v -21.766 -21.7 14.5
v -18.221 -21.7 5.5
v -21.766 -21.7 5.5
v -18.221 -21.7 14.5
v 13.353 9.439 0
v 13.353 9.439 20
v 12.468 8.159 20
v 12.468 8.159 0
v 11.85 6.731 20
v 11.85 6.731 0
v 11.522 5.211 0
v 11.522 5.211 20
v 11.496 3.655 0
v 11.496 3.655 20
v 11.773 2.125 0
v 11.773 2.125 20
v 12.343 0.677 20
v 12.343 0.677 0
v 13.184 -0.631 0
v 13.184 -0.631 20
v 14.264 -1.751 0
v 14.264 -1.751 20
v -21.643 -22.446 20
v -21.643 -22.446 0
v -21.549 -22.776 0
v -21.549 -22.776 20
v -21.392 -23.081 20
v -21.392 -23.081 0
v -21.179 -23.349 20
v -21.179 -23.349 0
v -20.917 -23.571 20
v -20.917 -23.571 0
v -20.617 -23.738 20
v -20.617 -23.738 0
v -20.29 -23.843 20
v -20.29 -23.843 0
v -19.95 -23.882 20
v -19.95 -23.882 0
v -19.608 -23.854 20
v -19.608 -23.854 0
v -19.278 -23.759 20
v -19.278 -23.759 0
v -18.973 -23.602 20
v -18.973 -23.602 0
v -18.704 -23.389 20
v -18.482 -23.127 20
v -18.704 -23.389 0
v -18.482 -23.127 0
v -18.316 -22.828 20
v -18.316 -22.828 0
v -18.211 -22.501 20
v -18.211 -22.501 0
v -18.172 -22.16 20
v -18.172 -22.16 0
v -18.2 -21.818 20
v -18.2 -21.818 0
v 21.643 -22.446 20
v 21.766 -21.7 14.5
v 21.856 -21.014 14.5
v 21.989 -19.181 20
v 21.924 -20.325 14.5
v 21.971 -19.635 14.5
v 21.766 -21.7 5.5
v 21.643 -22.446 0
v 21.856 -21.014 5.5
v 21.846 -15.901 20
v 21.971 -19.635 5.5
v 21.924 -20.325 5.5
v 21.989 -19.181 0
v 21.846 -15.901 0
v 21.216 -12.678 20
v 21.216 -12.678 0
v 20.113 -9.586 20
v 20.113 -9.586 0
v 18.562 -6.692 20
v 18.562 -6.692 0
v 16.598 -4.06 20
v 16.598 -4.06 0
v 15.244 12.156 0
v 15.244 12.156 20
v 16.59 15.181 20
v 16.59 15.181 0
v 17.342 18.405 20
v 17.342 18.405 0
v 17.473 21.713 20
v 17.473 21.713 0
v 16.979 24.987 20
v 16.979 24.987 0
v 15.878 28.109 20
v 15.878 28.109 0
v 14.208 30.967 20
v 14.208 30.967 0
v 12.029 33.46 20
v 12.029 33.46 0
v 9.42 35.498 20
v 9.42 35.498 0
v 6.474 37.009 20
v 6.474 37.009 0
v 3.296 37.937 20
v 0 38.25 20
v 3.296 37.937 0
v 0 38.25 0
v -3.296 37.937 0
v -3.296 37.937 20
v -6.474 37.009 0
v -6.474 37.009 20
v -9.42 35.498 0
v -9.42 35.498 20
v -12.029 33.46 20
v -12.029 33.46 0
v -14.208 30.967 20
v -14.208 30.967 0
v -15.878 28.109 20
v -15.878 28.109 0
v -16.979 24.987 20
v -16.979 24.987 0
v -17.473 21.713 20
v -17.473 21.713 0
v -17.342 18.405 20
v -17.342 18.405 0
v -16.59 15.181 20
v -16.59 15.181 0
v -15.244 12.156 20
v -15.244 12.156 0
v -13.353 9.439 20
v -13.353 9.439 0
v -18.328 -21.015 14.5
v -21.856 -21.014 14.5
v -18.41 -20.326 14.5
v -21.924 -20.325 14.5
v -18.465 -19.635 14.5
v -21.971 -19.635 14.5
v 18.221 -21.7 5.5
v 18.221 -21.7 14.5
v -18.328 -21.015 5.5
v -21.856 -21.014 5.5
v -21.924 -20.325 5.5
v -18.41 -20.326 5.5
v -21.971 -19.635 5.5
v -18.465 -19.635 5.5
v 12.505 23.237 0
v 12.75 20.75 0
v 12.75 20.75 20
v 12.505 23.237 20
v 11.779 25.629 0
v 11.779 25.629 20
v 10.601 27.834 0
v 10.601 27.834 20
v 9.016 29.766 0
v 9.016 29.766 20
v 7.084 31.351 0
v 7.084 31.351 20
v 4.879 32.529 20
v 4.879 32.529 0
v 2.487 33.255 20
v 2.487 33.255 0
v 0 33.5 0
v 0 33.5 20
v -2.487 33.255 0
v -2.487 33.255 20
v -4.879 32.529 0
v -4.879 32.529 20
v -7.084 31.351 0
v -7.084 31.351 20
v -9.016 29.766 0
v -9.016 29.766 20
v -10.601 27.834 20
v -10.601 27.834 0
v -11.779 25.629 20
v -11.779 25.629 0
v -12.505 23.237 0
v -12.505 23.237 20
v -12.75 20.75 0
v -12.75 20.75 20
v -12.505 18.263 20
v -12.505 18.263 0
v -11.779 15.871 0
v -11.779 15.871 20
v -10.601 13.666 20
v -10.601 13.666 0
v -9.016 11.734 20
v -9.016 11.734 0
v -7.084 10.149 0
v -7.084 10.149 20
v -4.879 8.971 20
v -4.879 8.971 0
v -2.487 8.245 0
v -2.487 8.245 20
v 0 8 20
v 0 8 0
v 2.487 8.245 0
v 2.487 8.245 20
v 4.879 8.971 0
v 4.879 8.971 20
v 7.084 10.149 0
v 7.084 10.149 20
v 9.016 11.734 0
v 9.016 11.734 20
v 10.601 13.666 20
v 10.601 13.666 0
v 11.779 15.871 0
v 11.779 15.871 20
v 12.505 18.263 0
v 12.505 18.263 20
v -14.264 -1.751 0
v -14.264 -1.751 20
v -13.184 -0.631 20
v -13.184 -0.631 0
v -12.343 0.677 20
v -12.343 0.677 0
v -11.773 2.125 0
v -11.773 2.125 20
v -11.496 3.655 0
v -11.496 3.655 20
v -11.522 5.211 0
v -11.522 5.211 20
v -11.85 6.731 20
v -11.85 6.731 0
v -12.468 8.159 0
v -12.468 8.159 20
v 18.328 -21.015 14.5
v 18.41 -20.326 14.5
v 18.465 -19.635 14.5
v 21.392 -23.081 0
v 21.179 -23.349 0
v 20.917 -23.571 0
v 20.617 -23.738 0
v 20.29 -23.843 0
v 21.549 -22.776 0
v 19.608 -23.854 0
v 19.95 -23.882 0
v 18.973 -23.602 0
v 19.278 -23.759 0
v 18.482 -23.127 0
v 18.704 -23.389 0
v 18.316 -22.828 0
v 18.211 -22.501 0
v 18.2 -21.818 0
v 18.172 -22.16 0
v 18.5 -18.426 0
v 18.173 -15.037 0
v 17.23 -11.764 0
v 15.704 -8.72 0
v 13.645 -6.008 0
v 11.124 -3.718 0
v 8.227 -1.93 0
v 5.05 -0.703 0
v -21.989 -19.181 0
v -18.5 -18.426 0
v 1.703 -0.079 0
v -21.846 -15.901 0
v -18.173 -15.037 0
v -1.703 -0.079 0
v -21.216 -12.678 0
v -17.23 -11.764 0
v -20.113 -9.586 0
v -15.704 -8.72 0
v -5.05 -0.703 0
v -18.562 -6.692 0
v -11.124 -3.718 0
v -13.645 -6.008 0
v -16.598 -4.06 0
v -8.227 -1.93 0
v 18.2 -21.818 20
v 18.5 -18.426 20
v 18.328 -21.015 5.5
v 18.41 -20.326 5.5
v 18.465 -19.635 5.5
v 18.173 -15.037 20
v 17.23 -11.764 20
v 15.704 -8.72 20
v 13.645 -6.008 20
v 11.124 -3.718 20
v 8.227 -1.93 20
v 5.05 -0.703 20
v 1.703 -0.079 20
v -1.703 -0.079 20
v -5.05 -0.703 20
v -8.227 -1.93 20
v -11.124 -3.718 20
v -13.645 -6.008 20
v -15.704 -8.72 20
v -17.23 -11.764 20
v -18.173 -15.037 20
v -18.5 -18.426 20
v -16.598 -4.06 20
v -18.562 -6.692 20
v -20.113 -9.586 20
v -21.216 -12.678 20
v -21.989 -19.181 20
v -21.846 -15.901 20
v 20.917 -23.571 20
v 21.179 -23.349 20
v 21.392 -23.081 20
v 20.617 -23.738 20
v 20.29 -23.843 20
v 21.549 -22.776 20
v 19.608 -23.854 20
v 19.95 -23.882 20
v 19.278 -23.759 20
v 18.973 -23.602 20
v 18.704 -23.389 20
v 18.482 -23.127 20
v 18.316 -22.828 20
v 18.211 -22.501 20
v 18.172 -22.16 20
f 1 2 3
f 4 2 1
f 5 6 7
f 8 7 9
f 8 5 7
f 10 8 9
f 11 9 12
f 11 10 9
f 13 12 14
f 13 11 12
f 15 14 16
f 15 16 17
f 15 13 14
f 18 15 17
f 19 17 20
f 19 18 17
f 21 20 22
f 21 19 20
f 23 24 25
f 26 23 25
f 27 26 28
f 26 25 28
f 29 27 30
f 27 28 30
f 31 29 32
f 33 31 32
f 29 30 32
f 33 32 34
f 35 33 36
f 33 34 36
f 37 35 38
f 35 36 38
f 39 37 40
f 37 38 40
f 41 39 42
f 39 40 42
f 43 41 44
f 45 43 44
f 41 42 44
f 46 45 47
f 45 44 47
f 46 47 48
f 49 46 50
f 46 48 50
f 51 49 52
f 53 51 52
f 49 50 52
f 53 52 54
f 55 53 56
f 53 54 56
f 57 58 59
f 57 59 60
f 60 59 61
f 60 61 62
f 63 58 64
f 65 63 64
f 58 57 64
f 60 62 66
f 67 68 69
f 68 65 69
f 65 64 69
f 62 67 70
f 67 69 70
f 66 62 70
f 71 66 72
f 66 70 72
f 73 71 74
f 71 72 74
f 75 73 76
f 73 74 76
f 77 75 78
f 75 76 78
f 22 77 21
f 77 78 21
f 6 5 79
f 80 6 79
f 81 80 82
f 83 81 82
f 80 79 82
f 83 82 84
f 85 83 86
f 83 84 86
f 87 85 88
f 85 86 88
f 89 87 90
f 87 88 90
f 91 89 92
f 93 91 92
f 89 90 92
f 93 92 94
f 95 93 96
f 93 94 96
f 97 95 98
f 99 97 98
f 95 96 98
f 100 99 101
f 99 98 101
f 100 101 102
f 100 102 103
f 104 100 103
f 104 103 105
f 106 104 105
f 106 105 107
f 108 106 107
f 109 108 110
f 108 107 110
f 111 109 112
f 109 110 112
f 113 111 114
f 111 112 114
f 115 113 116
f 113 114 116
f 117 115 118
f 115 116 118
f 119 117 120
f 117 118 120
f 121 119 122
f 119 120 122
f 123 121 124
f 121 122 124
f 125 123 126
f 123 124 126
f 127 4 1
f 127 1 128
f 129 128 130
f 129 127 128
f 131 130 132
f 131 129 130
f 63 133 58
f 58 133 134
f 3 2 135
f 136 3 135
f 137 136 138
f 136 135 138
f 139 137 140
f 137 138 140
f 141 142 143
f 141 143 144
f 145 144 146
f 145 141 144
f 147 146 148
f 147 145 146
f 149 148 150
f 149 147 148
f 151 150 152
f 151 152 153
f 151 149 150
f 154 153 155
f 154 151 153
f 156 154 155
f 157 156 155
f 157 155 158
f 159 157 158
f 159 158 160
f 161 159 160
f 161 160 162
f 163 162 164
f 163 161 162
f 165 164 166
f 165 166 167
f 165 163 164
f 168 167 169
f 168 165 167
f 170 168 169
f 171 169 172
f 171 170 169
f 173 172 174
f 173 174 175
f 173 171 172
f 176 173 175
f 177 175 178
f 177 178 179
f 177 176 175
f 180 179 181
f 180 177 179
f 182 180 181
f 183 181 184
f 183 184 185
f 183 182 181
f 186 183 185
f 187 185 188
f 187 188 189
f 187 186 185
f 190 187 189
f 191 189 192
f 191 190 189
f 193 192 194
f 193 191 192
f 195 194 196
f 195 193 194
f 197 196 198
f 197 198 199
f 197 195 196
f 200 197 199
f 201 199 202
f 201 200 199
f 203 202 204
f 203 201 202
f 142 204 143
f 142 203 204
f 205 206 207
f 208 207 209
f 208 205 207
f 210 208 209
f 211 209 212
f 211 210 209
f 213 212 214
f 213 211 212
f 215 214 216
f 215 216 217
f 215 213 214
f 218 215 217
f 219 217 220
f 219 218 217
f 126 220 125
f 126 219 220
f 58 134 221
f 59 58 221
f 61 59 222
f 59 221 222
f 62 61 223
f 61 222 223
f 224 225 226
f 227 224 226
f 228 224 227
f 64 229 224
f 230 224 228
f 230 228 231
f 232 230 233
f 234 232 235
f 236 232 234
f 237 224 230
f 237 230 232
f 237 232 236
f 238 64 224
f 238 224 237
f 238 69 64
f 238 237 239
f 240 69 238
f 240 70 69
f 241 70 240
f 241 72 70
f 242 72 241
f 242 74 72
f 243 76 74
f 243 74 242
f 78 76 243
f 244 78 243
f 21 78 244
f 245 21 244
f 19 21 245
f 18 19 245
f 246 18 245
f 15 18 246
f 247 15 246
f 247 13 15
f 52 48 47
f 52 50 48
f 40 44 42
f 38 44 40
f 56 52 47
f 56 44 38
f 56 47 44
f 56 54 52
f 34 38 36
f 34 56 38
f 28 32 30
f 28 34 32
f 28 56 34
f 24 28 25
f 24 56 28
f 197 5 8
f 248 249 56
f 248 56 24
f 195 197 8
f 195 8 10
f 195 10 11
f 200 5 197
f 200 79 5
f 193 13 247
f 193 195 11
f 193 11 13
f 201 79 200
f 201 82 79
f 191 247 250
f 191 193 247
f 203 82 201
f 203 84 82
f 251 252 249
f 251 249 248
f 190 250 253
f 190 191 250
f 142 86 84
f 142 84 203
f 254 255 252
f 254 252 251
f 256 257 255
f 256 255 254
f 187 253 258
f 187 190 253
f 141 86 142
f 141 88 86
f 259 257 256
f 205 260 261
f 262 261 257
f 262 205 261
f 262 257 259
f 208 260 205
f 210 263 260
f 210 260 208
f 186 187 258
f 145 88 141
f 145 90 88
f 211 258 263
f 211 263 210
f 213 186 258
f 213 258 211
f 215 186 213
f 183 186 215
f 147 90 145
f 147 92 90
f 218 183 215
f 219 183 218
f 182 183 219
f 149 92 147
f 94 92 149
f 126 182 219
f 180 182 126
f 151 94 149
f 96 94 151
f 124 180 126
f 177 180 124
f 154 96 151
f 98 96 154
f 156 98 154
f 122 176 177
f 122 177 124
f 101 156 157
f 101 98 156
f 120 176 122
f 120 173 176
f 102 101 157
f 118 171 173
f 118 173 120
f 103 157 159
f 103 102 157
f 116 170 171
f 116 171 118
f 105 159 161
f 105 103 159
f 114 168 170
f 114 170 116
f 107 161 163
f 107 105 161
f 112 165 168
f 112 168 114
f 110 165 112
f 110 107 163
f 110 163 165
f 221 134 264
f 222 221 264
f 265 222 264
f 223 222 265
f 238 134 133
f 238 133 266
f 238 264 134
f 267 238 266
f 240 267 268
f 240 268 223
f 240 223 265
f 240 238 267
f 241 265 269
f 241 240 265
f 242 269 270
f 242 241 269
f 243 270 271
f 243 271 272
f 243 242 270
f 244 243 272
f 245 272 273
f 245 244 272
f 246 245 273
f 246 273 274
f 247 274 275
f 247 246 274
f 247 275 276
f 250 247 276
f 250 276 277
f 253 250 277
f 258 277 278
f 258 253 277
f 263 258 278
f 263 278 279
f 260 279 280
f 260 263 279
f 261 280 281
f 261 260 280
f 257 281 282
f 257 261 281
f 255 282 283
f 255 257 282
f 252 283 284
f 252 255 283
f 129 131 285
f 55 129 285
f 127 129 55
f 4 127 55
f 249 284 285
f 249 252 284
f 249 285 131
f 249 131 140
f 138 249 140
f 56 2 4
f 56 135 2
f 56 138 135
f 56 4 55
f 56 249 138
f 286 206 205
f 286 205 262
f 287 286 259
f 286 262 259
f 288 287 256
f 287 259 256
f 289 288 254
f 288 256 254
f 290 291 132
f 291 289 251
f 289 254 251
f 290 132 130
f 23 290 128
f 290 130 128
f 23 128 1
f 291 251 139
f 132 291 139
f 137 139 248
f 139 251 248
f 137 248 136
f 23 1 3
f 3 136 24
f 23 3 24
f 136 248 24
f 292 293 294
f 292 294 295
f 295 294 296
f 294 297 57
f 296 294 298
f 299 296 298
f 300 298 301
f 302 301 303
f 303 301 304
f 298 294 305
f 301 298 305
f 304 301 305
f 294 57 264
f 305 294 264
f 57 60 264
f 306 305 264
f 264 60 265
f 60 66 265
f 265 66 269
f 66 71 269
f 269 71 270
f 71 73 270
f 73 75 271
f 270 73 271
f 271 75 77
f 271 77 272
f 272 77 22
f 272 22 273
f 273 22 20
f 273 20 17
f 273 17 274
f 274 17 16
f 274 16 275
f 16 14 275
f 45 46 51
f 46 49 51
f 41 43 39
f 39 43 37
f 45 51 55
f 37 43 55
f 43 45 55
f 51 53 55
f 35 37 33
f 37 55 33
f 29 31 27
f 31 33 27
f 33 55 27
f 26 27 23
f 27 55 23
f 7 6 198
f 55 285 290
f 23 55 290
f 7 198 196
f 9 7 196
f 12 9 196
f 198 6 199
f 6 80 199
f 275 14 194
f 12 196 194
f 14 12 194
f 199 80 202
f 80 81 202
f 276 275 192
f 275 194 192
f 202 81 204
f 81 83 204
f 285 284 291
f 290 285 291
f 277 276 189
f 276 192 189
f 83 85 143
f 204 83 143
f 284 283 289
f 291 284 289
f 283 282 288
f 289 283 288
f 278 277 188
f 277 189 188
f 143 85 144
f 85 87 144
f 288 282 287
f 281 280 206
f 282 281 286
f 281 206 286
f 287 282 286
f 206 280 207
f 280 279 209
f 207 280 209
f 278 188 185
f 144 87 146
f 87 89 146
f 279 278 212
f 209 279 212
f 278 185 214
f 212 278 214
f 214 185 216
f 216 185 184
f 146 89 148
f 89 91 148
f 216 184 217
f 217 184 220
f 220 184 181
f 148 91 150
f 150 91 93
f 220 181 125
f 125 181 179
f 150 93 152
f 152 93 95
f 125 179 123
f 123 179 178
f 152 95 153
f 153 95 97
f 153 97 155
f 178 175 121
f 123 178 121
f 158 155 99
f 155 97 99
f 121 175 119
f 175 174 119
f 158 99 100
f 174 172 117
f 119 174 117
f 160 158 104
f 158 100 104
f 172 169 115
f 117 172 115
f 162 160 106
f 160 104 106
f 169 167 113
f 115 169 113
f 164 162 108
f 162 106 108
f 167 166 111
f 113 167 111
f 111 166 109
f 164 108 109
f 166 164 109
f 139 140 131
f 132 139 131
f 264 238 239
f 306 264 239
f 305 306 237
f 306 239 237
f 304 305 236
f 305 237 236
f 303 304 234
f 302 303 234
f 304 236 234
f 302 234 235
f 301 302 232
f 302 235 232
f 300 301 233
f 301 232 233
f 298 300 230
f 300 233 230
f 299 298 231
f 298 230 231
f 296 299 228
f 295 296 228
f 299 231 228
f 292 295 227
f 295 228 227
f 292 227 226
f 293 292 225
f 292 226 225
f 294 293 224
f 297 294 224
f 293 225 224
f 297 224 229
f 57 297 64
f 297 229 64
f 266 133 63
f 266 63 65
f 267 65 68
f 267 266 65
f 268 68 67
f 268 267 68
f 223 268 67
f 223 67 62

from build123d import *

# Parameters (mm, degrees)
SKETCH_R          = 12.75
PAD_DEPTH         = 20
SKETCH001_W       = 2.064916
SKETCH001_H       = 9
POCKET_DEPTH      = 22.001
POCKET_DEPTH_BACK = 22.001


with BuildPart() as part:
    # Sketch → Pad (new body)
    with BuildSketch(Plane.XY):
        with BuildLine():
            ThreePointArc((18.2, -21.818132), (0, 0), (-18.2, -21.818132))
            ThreePointArc((-21.643243, -22.445887), (-19.607744, -23.853631), (-18.2, -21.818132))
            ThreePointArc((-14.264293, -1.750971), (-20.722154, -11.111337), (-21.643243, -22.445887))
            ThreePointArc((-14.264293, -1.750971), (-11.495515, 3.655407), (-13.352959, 9.438568))
            ThreePointArc((13.352959, 9.438568), (0, 38.25), (-13.352959, 9.438568))
            ThreePointArc((13.352959, 9.438568), (11.495515, 3.655407), (14.264293, -1.750971))
            ThreePointArc((21.643243, -22.445887), (20.722154, -11.111337), (14.264293, -1.750971))
            ThreePointArc((18.2, -21.818132), (19.607744, -23.853631), (21.643243, -22.445887))
        make_face()
        with Locations((0, 20.75)):
            Circle(SKETCH_R, mode=Mode.SUBTRACT)
    extrude(amount=PAD_DEPTH)

    # Sketch001 → Pocket (cut, two sides)
    with BuildSketch(Plane.YZ) as pocket_sk:
        with Locations((-20.667451, 10)):
            Rectangle(SKETCH001_W, SKETCH001_H)
    extrude(amount=-POCKET_DEPTH, mode=Mode.SUBTRACT)
    extrude(pocket_sk.sketch, amount=POCKET_DEPTH_BACK, mode=Mode.SUBTRACT)


solid = part.part
